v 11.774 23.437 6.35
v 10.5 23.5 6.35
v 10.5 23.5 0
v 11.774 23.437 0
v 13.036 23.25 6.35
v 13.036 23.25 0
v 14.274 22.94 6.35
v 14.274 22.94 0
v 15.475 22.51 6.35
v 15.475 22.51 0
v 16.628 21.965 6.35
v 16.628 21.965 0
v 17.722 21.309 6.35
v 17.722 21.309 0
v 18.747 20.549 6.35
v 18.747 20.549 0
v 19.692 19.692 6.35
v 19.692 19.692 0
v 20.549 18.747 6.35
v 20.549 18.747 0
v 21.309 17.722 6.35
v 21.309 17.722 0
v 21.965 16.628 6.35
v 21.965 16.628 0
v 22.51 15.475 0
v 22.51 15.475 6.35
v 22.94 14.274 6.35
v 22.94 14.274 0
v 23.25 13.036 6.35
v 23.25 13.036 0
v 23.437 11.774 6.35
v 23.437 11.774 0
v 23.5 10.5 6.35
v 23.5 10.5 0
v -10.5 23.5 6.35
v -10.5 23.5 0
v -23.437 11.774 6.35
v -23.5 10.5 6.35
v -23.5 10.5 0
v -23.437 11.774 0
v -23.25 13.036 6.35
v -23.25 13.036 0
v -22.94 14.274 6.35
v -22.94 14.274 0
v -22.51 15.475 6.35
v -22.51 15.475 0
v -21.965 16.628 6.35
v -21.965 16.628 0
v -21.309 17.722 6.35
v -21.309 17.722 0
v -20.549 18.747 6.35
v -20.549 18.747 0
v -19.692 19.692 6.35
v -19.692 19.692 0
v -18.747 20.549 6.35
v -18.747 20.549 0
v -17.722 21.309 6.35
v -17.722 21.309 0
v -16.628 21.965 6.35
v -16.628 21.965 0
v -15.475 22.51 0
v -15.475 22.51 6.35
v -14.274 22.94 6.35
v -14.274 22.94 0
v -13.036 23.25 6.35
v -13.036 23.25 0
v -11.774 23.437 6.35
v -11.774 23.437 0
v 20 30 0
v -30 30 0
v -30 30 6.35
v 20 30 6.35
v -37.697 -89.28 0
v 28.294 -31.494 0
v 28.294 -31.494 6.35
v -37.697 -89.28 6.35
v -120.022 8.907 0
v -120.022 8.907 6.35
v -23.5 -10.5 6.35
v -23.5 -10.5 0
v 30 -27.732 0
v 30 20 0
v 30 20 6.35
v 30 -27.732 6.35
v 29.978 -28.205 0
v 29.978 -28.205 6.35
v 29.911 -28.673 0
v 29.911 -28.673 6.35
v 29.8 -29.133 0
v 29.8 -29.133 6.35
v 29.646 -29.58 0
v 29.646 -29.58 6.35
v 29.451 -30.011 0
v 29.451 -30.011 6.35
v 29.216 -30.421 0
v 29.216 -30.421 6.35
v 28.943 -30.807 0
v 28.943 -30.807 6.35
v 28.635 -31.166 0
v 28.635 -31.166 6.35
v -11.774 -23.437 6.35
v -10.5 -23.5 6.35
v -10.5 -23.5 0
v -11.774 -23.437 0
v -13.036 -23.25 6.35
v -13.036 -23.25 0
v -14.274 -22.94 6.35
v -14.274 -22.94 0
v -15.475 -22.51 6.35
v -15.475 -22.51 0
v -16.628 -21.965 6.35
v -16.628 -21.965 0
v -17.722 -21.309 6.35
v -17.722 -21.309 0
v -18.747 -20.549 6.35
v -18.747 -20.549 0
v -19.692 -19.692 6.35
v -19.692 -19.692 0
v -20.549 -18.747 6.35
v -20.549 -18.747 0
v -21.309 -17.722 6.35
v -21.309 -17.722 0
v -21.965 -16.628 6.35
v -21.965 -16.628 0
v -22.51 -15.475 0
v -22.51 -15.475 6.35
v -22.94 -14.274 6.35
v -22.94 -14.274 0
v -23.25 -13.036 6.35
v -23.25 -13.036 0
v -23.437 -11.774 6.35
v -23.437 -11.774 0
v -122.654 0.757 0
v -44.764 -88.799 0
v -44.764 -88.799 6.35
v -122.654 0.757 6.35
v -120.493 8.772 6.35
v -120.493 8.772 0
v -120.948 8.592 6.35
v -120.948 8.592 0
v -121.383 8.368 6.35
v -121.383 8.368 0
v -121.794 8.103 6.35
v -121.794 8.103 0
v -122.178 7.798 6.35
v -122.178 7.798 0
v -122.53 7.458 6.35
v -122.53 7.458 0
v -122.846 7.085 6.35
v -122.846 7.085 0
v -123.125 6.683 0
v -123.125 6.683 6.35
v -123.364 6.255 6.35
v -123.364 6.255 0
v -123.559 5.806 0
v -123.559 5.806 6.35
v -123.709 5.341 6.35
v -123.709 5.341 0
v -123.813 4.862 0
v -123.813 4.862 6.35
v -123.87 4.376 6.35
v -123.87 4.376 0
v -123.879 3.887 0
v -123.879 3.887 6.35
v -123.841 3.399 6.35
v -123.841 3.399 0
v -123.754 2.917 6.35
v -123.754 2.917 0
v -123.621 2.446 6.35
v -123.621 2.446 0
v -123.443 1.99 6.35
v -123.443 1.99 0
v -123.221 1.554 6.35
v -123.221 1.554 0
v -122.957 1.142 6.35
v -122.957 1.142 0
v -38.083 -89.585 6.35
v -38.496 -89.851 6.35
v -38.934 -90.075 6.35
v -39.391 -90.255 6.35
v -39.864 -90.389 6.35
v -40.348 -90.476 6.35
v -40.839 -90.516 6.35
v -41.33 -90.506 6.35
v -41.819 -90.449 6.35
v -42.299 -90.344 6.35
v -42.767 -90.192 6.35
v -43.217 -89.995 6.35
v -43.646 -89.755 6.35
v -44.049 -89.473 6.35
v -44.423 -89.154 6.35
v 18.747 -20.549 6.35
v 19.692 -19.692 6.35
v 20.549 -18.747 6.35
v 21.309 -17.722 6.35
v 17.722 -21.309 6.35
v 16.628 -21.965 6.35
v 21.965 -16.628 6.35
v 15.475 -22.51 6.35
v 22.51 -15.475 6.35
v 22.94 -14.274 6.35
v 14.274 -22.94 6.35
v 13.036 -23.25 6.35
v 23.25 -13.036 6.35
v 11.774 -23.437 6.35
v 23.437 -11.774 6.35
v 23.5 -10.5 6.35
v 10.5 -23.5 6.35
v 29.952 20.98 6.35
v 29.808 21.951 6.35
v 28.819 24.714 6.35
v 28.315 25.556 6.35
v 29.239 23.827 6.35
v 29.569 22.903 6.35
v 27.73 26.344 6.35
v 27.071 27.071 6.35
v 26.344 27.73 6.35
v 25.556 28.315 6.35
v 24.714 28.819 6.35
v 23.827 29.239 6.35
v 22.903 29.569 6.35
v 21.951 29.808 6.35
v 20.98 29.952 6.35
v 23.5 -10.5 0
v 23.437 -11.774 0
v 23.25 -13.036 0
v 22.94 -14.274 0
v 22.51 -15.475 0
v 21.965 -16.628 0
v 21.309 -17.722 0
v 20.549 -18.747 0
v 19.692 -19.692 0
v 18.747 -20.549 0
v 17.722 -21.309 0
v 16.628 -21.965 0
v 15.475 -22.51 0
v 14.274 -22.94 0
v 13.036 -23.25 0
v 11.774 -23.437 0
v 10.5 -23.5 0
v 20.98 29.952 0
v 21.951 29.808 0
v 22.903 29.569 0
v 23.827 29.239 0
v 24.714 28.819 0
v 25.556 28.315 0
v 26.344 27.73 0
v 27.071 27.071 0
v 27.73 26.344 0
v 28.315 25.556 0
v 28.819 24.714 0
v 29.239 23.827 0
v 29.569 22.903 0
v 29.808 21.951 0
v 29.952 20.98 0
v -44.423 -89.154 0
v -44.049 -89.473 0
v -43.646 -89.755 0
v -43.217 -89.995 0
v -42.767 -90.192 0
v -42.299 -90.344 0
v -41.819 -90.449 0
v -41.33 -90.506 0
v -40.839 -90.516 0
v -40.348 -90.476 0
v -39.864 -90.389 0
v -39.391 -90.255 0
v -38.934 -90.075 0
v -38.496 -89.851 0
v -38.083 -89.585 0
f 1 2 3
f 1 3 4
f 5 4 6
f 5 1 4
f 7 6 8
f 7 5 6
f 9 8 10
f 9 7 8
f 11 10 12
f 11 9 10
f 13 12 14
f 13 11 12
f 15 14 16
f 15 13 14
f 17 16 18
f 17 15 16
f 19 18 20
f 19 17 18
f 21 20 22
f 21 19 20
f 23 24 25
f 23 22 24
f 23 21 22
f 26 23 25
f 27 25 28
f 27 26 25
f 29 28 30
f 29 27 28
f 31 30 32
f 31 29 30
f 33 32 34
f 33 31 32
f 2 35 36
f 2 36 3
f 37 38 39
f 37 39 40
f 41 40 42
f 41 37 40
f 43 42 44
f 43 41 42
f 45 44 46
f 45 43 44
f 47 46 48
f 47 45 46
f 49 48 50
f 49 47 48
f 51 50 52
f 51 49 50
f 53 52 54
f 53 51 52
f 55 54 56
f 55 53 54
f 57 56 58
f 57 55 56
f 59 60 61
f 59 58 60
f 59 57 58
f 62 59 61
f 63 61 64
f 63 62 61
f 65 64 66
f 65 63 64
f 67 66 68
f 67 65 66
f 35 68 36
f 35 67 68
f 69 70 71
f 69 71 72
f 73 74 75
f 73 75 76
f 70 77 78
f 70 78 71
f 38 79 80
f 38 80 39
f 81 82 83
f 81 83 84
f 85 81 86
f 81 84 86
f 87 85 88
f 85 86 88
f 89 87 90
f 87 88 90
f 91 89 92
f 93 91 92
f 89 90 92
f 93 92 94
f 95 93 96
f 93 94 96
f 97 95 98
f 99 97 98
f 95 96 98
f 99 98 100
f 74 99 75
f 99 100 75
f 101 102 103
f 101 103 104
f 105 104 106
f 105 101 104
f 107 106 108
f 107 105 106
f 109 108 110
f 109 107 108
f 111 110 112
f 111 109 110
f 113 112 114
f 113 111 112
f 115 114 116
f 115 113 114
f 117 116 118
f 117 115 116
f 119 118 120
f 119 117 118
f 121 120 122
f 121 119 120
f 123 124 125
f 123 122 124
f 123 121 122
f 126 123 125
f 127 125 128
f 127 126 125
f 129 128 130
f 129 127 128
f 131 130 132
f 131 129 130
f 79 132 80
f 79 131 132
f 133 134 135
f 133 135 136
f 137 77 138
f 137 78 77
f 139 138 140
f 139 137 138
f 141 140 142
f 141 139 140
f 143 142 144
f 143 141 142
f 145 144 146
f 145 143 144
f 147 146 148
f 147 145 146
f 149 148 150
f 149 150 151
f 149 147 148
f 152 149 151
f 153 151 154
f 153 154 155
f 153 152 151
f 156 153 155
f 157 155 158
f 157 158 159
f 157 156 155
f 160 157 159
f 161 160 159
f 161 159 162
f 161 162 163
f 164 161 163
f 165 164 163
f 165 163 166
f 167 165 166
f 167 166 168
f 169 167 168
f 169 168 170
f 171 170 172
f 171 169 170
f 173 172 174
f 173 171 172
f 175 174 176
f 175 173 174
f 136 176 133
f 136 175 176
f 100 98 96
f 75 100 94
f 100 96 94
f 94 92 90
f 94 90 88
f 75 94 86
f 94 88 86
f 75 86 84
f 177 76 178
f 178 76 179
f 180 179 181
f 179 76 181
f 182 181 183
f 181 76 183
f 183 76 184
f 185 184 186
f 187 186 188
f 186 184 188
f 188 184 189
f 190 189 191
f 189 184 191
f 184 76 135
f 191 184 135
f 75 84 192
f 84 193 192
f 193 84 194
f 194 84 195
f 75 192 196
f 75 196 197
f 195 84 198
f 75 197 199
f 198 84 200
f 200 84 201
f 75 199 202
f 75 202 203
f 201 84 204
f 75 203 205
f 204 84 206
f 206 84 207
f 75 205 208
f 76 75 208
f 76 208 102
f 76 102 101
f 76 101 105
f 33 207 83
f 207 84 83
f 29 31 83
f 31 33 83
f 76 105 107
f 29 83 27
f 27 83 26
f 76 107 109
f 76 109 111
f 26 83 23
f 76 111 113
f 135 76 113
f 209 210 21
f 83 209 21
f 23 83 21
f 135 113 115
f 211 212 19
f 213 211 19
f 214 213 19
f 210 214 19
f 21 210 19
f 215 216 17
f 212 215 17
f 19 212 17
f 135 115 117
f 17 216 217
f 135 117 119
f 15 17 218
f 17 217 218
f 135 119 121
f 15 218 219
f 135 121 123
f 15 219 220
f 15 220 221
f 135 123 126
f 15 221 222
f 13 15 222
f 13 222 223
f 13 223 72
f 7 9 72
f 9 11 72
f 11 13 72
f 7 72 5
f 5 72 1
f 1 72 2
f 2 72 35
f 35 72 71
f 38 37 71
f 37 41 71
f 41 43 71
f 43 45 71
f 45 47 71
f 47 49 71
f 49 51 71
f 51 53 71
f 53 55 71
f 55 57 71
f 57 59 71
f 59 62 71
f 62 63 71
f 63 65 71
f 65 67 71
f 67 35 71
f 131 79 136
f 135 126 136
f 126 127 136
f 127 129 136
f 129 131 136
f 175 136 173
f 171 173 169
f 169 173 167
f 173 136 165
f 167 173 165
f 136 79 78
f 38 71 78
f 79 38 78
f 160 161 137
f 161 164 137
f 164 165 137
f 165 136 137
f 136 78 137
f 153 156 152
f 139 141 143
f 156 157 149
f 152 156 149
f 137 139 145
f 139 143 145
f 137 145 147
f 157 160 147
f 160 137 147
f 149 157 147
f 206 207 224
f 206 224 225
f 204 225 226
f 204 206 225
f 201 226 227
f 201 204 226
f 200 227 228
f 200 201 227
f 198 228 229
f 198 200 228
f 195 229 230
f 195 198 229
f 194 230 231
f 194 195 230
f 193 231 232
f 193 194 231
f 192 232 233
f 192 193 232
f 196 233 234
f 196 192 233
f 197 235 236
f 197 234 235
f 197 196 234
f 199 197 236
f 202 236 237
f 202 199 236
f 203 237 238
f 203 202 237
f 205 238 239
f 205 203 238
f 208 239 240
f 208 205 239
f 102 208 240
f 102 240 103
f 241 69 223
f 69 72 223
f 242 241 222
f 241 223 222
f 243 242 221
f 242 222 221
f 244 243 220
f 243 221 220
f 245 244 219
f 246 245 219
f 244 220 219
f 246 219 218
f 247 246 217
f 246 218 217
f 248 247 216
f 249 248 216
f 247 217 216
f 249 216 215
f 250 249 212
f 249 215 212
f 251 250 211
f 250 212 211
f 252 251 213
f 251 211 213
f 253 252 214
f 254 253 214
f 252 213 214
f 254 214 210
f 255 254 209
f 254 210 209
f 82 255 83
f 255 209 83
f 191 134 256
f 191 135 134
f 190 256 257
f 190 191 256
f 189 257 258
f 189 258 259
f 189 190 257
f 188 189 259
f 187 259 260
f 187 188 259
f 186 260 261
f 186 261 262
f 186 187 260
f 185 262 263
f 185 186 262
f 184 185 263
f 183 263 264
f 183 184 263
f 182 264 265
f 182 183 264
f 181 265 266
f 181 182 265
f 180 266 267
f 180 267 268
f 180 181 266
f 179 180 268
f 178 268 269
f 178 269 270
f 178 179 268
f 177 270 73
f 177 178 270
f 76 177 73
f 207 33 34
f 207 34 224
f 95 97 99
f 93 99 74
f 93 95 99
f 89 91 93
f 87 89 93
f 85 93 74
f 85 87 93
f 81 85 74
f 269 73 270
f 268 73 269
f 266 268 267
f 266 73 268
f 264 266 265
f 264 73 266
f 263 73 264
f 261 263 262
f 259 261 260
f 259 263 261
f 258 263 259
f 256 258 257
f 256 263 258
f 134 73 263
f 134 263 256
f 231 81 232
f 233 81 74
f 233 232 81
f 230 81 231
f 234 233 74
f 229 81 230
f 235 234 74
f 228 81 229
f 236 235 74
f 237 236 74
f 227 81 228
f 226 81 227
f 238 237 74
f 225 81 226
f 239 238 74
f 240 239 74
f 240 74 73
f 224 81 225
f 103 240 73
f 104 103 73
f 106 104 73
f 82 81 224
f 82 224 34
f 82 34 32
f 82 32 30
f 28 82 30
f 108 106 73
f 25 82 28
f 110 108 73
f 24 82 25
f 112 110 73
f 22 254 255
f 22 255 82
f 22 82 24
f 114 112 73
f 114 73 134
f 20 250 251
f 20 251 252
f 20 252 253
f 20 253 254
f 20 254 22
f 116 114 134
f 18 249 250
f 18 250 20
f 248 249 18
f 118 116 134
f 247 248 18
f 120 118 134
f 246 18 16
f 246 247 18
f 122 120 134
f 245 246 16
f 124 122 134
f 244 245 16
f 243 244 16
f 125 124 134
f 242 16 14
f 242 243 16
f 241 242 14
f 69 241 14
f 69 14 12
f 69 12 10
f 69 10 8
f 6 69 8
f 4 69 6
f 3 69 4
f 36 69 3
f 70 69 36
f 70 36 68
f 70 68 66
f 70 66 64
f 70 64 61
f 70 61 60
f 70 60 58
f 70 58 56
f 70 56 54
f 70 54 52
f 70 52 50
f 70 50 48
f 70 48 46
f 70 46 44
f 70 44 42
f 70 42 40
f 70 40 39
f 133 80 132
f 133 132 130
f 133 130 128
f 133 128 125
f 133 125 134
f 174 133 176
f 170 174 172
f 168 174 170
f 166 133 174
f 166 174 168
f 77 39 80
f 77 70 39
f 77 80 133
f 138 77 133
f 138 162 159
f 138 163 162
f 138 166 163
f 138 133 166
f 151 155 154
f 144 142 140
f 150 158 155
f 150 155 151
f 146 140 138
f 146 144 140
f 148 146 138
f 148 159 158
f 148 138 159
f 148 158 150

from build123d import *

# Parameters (mm, degrees)
BOSS_EXTRUDE1_DEPTH = 6.35
FILLET1_R           = 10
FILLET2_R           = 5
CUT_EXTRUDE1_DEPTH  = 7.35


with BuildPart() as part:
    # Sketch2 → Boss-Extrude1 (new body)
    with BuildSketch(Plane.XY):
        Polygon((-30, 30), (30, 30), (30, -30), (-41.471442061, -92.584606492), (-128.09675639, 7.014865983), align=None)
    extrude(amount=BOSS_EXTRUDE1_DEPTH)

    # Fillet1
    fillet1_edges = [part.edges().sort_by_distance(p)[0] for p in [
        (30, 30, 3.175),
    ]]
    fillet(fillet1_edges, radius=FILLET1_R)

    # Fillet2
    fillet2_edges = [part.edges().sort_by_distance(p)[0] for p in [
        (-41.471442061, -92.584606492, 3.175),
        (-128.09675639, 7.014865983, 3.175),
        (30, -30, 3.175),
    ]]
    fillet(fillet2_edges, radius=FILLET2_R)

    # Sketch3 → Cut-Extrude1 (cut, through all)
    with BuildSketch(Plane.XY.offset(6.35)):
        with BuildLine():
            Line((-10.5, 23.5), (10.5, 23.5))
            ThreePointArc((10.5, 23.5), (19.692388155, 19.692388155), (23.5, 10.5))
            Line((23.5, 10.5), (23.5, -10.5))
            ThreePointArc((23.5, -10.5), (19.692388155, -19.692388155), (10.5, -23.5))
            Line((10.5, -23.5), (-10.5, -23.5))
            ThreePointArc((-10.5, -23.5), (-19.692388155, -19.692388155), (-23.5, -10.5))
            Line((-23.5, -10.5), (-23.5, 10.5))
            ThreePointArc((-23.5, 10.5), (-19.692388155, 19.692388155), (-10.5, 23.5))
        make_face()
    extrude(amount=-CUT_EXTRUDE1_DEPTH, mode=Mode.SUBTRACT)


solid = part.part
